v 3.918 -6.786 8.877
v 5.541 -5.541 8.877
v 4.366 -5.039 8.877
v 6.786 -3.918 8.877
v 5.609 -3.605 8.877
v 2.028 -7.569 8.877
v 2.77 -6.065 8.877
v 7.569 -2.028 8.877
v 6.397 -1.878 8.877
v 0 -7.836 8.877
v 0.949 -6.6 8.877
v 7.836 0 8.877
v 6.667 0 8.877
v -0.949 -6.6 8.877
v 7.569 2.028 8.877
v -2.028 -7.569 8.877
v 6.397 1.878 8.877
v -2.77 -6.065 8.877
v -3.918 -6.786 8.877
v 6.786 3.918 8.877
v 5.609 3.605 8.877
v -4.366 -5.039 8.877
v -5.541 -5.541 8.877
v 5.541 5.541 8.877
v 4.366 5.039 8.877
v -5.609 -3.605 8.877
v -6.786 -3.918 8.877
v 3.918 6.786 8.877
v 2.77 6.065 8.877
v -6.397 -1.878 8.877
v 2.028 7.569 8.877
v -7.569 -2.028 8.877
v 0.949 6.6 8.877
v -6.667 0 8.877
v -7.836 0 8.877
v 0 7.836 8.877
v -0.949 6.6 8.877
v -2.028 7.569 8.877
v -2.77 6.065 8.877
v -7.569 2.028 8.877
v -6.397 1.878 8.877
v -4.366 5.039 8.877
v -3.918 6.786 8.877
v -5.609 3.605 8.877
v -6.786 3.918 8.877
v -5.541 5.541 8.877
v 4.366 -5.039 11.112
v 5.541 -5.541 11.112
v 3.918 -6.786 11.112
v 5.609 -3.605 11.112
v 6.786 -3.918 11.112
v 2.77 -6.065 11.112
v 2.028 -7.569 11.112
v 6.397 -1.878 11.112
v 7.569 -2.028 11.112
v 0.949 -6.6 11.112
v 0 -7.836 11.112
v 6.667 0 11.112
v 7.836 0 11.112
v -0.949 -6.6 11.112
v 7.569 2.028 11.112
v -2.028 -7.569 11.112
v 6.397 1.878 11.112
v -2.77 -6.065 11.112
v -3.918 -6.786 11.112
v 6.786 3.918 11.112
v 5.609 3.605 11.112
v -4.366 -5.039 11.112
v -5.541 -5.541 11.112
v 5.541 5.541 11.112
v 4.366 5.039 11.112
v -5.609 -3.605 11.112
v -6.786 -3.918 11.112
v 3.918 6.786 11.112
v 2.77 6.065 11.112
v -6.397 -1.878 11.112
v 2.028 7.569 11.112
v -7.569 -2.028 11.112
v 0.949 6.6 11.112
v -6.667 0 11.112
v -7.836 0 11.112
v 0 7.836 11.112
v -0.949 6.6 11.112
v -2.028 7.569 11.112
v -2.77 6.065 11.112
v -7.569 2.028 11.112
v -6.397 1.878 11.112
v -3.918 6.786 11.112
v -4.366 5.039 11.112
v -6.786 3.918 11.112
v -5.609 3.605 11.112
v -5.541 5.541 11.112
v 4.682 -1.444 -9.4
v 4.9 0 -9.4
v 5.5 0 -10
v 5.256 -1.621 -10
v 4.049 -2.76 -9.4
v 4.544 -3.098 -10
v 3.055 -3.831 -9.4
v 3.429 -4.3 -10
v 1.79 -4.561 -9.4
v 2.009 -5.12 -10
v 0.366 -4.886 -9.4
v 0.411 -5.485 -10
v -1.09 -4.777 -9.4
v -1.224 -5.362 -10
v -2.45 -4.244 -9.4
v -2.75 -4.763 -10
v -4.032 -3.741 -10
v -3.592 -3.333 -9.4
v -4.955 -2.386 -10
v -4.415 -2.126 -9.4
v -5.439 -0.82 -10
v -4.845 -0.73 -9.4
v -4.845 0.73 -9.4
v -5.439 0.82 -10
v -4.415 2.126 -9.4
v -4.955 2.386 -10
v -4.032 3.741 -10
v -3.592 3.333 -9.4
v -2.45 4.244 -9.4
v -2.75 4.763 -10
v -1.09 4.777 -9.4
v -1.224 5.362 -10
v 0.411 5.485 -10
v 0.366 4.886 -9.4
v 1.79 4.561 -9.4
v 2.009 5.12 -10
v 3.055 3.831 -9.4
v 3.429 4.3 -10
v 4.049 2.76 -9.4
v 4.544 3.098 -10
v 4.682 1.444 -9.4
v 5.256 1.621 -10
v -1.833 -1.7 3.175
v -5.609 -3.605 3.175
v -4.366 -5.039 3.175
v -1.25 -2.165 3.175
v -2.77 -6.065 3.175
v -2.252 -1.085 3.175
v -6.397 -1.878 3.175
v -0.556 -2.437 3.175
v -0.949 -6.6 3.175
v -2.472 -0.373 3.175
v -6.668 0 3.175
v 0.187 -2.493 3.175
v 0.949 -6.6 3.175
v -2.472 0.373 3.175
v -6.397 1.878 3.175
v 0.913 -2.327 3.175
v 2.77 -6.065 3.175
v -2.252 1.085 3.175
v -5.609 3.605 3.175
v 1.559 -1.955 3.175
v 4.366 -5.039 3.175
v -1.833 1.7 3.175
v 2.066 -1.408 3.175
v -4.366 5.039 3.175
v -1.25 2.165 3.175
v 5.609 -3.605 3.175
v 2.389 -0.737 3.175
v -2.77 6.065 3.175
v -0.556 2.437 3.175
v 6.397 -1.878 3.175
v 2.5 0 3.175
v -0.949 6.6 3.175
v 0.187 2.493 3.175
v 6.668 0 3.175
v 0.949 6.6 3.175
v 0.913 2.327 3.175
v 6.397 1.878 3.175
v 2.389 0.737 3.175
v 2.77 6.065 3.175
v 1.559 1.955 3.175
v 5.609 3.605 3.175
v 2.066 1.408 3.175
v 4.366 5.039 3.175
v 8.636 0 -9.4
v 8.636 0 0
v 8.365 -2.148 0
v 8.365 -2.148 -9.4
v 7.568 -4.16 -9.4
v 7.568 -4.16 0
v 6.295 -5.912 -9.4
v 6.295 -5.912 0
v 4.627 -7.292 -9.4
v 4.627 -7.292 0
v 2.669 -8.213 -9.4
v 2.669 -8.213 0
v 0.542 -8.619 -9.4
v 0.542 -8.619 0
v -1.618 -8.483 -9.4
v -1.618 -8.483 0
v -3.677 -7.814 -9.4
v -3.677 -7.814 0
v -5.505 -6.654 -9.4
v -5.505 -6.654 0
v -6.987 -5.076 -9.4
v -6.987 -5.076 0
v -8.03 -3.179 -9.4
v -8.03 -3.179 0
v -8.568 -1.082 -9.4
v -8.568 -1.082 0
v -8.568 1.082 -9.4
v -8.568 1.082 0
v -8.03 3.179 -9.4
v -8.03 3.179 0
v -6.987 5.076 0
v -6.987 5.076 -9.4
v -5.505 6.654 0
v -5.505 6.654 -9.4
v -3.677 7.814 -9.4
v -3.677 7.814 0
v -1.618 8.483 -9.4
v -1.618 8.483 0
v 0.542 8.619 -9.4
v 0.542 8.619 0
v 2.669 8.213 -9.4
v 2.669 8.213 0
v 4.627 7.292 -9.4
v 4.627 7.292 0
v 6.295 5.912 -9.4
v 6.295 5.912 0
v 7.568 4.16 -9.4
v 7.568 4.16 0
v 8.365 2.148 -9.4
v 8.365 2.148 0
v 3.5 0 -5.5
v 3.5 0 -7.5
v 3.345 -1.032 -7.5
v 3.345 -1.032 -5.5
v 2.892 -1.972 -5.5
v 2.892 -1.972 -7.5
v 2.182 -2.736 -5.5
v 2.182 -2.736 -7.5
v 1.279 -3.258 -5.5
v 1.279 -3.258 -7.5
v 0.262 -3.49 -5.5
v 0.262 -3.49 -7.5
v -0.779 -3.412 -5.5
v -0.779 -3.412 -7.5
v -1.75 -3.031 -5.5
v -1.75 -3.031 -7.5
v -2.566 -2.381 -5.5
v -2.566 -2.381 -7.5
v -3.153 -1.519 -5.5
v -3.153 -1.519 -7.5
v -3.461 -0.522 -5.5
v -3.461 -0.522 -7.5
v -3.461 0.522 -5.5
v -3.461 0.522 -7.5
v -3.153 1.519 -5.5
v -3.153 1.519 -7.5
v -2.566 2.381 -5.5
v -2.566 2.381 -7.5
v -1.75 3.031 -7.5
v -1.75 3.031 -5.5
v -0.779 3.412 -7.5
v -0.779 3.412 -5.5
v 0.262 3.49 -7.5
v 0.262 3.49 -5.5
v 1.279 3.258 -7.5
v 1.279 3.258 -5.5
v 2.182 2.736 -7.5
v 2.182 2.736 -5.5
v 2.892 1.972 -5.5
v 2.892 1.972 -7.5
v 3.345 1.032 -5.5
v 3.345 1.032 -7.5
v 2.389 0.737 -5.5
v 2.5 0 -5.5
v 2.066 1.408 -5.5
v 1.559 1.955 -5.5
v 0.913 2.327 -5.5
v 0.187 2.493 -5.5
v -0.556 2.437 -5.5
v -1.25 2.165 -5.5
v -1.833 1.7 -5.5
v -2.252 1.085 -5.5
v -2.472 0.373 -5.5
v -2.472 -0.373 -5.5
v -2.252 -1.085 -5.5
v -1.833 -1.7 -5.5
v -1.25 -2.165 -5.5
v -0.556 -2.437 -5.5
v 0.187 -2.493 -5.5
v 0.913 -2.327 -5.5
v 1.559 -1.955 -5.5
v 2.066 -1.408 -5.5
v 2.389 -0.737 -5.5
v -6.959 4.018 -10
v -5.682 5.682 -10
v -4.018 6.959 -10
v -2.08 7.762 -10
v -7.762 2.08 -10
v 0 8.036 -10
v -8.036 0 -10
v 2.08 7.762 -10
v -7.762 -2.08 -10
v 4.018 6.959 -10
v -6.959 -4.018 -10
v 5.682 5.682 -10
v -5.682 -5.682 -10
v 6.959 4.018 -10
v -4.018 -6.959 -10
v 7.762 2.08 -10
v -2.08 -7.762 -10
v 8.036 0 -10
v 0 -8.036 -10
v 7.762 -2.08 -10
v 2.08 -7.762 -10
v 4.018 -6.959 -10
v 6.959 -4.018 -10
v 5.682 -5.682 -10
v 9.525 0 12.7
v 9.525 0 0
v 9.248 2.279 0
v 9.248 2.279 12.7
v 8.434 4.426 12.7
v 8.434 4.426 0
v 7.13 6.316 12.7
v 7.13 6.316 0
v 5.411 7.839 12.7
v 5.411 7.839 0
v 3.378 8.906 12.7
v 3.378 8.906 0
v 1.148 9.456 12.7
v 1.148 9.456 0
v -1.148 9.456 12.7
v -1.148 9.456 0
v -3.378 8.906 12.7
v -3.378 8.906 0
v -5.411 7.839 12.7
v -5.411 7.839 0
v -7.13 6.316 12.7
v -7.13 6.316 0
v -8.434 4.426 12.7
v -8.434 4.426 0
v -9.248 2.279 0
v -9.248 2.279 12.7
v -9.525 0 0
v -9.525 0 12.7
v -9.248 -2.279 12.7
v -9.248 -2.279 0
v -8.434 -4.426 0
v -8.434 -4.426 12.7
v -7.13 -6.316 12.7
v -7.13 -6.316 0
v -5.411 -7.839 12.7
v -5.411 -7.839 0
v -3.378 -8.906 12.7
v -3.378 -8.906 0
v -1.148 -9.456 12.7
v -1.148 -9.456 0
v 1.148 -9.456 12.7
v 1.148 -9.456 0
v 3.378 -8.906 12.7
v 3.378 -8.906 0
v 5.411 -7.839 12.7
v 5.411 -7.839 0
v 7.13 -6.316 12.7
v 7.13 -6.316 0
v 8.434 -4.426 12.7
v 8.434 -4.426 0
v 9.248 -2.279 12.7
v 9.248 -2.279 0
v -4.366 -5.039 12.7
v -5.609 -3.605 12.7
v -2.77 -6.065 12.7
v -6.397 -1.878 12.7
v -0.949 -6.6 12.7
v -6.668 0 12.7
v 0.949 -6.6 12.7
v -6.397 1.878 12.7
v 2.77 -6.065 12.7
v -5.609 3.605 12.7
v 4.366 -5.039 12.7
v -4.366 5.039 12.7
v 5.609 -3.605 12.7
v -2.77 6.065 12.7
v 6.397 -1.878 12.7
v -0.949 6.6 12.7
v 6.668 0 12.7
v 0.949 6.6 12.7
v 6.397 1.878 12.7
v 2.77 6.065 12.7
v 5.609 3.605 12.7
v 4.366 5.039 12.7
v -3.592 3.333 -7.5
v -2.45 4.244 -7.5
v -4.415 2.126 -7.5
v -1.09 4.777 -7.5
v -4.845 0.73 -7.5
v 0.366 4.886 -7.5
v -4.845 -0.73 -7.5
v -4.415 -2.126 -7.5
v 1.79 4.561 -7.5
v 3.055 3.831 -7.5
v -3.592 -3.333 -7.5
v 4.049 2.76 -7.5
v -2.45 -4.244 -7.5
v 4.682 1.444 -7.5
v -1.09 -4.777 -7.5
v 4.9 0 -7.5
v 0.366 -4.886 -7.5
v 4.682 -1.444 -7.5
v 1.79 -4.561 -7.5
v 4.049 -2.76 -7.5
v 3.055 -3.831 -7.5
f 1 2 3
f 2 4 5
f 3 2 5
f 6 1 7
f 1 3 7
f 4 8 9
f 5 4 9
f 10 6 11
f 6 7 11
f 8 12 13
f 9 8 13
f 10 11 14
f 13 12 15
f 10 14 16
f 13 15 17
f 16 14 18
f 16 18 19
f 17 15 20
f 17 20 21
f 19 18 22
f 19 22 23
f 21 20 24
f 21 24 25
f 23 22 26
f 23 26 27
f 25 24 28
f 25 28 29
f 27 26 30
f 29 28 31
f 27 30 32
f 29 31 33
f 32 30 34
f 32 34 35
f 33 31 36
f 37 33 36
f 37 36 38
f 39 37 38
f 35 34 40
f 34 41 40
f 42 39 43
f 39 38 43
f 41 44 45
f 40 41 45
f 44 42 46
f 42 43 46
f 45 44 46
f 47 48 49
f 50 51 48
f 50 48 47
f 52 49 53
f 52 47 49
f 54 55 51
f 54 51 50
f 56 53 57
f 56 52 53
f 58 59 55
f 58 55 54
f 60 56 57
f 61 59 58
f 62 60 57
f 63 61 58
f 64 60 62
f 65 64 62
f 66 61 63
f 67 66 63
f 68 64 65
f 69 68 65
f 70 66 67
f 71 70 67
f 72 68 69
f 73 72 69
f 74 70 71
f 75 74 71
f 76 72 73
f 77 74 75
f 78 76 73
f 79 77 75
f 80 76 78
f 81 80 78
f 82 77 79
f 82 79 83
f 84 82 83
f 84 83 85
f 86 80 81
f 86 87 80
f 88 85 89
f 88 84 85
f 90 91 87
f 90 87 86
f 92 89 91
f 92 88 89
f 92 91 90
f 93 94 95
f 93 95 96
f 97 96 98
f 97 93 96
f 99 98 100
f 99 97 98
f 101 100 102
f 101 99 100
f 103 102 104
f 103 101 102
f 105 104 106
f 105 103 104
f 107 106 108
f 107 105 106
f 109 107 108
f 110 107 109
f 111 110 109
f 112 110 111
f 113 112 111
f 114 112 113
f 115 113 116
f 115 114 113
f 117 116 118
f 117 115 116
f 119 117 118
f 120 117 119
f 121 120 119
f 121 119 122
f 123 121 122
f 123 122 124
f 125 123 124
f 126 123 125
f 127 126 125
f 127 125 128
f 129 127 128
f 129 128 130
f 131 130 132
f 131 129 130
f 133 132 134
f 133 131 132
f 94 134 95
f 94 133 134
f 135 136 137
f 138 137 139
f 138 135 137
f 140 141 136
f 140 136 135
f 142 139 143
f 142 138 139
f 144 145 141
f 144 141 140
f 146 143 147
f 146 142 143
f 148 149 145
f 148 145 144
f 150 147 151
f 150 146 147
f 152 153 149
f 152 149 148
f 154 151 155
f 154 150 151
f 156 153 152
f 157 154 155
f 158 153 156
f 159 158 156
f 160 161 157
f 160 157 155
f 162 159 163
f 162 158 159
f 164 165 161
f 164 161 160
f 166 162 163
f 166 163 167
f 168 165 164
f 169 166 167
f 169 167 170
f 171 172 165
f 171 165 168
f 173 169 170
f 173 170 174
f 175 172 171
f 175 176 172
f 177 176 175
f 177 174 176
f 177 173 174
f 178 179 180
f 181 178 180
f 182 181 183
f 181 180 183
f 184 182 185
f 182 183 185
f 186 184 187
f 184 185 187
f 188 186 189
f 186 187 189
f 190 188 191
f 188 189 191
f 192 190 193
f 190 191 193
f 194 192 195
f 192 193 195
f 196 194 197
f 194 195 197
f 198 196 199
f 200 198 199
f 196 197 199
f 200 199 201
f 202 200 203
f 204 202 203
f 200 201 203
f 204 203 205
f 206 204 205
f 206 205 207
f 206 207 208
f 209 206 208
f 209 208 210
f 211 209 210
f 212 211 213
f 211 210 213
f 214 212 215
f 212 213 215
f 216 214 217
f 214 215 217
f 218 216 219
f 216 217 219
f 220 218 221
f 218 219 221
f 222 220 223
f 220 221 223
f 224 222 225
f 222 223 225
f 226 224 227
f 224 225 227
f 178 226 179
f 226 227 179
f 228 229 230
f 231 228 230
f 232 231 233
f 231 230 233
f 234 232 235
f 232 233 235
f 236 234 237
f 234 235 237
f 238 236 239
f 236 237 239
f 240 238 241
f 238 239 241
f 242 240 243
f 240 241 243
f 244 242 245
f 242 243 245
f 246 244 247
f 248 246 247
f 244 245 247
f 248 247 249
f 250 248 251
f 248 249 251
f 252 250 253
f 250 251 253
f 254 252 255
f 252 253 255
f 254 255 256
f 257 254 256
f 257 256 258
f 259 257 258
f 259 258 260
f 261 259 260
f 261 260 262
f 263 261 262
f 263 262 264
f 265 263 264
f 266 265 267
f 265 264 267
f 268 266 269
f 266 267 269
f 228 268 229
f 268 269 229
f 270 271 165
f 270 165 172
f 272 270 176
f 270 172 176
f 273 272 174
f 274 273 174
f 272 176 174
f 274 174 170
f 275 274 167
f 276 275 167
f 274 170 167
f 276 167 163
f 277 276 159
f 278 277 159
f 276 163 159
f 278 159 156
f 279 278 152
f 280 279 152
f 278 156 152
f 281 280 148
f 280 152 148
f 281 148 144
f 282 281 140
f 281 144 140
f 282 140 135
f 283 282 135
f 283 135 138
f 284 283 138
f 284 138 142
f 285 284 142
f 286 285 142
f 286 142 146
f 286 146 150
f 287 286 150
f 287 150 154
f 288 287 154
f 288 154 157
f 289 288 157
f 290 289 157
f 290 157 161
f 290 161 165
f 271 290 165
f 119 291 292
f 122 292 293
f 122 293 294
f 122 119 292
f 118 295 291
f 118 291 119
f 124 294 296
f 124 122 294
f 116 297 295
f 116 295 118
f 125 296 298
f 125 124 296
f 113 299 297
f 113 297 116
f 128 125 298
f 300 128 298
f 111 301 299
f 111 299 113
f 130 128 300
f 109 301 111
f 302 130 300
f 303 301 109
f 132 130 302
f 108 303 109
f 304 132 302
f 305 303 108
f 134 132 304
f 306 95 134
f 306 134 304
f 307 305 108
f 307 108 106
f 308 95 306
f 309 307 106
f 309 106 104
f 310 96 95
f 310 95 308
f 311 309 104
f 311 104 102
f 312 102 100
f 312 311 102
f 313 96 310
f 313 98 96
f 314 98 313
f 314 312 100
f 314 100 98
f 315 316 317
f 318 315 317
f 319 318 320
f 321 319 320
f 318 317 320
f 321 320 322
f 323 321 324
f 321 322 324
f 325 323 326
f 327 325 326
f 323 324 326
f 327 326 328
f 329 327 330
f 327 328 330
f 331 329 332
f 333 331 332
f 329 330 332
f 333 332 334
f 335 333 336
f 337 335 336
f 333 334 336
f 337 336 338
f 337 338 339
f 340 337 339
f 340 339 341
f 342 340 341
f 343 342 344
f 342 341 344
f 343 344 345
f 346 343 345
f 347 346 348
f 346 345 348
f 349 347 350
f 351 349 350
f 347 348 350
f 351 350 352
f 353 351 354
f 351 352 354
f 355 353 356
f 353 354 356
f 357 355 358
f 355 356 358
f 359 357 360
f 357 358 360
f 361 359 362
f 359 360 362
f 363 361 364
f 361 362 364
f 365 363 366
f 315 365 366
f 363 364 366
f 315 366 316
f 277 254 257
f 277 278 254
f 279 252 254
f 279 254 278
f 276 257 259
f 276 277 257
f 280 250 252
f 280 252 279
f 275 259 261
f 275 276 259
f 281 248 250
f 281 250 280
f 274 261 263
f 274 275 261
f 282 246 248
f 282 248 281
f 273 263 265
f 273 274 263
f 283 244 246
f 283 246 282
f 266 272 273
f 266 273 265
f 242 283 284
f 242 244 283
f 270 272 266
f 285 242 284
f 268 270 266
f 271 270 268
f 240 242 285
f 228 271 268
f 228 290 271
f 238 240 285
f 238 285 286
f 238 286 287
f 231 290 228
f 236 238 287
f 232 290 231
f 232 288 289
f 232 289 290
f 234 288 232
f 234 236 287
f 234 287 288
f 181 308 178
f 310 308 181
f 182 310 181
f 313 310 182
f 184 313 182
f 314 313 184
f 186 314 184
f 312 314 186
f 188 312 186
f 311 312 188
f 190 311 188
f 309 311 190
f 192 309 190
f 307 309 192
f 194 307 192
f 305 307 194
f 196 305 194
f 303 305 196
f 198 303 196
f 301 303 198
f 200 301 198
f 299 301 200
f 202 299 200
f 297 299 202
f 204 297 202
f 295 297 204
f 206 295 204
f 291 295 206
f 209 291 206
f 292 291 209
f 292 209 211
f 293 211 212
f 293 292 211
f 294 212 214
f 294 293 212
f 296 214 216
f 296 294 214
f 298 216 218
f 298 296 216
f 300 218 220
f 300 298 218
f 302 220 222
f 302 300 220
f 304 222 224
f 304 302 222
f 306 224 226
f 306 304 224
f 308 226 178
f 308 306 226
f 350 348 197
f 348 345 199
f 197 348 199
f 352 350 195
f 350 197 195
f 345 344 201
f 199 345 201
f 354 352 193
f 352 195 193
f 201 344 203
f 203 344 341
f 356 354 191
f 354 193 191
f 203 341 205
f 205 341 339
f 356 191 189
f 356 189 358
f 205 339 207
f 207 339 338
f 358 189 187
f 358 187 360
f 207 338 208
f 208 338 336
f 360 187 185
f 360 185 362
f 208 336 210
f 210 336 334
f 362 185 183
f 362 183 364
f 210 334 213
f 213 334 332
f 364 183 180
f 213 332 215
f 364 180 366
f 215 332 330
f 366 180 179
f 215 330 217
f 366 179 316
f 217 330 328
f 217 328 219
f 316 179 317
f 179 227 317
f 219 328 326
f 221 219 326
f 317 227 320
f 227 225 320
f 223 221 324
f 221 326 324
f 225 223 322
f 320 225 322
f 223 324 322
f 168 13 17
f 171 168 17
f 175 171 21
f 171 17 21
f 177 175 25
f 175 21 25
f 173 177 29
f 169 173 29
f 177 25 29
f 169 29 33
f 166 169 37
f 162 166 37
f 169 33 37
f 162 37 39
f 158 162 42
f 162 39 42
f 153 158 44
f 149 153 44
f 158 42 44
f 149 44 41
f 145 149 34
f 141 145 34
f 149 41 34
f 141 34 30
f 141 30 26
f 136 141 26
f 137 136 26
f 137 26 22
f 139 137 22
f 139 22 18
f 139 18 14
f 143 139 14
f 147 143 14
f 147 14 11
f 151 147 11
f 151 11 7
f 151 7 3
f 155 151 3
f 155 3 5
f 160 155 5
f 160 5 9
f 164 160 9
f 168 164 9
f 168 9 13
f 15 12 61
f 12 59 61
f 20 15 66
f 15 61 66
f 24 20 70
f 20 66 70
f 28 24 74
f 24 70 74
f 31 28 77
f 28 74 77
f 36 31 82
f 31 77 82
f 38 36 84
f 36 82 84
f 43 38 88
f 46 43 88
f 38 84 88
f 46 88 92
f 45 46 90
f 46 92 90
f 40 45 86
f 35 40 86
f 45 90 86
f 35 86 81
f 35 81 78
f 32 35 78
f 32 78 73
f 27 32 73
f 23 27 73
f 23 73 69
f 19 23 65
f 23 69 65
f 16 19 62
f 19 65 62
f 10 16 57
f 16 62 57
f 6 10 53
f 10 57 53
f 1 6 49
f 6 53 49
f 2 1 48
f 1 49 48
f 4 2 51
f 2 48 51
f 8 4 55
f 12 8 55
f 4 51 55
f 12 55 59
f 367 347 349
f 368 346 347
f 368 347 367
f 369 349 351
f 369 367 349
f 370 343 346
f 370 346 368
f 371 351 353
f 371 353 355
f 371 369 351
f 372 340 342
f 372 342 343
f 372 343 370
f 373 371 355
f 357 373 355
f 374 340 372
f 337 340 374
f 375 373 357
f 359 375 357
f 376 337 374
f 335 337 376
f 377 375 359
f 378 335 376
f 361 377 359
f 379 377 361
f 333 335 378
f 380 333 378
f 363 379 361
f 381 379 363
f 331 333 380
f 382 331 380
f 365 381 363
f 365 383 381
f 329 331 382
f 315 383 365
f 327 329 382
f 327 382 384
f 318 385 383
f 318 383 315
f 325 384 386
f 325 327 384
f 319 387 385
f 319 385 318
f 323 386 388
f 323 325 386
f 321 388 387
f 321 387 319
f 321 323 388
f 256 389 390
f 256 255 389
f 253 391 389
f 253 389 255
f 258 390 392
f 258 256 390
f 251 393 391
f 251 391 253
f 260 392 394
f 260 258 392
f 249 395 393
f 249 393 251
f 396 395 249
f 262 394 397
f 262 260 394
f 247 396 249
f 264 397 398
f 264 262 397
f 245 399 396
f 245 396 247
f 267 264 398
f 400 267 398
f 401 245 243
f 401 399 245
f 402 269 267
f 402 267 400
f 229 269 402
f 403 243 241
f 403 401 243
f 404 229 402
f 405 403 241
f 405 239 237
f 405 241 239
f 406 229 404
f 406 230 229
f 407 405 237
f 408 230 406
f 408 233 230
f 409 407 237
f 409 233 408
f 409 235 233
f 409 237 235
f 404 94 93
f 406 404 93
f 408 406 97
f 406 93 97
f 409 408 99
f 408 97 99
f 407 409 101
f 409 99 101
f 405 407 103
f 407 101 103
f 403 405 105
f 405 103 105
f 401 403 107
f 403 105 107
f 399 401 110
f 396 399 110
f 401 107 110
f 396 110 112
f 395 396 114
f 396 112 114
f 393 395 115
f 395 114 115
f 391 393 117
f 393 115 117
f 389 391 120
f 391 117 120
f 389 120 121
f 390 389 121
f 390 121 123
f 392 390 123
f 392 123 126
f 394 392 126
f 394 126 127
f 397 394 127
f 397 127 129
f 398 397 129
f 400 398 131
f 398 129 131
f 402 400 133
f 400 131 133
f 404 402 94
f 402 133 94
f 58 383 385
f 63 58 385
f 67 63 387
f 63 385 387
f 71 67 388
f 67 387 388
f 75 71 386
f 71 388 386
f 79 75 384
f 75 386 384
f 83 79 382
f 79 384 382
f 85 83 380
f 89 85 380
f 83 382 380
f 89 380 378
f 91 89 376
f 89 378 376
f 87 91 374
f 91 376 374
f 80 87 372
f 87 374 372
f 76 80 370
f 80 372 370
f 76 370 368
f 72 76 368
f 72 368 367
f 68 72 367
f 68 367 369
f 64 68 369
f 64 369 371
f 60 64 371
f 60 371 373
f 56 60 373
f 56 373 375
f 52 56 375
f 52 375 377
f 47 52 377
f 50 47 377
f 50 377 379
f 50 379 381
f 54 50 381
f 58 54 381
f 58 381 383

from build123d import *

# Parameters (mm, degrees)
F0_R      = 9.525
F1_DEPTH  = 12.7
F2_R      = 6.6675
F3_DEPTH  = 9.525
F4_W      = 1.1684
F4_H      = 2.2352
F6_R      = 8.636
F7_DEPTH  = 10
F8_R      = 4.9
F9_DEPTH  = 2.5
F10_R     = 2.5
F11_DEPTH = 25.4
F12_R     = 3.5
F13_DEPTH = 2
F14_SIZE  = 0.6


with BuildPart() as f1:
    # F0 (on Top) → F1 (new body)
    with BuildSketch(Plane.XY):
        Circle(F0_R)
    extrude(amount=F1_DEPTH)

    # F2 (on face) → F3 (cut)
    with BuildSketch(Plane.XY.offset(12.7)):
        Circle(F2_R)
    extrude(amount=-F3_DEPTH, mode=Mode.SUBTRACT)

    # F4 (on Front) → F5 (revolve, cut)
    with BuildSketch(Plane.XZ):
        with Locations((7.2517, 9.9949)):
            Rectangle(F4_W, F4_H)
    revolve(axis=Axis((0, 0, 19.022157), (0, 0, 1)), mode=Mode.SUBTRACT)

    # F6 (on face) → F7 (join)
    with BuildSketch(Plane(origin=(0, 0, 0), x_dir=(1, 0, 0), z_dir=(0, 0, -1))):
        Circle(F6_R)
    extrude(amount=F7_DEPTH)

    # F8 (on face) → F9 (cut)
    with BuildSketch(Plane(origin=(0, 0, -10), x_dir=(1, 0, 0), z_dir=(0, 0, -1))):
        Circle(F8_R)
    extrude(amount=-F9_DEPTH, mode=Mode.SUBTRACT)

    # F10 (on face) → F11 (cut)
    with BuildSketch(Plane.XY.offset(3.175)):
        Circle(F10_R)
    extrude(amount=-F11_DEPTH, mode=Mode.SUBTRACT)

    # F12 (on face) → F13 (cut)
    with BuildSketch(Plane(origin=(0, 0, -7.5), x_dir=(1, 0, 0), z_dir=(0, 0, -1))):
        Circle(F12_R)
    extrude(amount=-F13_DEPTH, mode=Mode.SUBTRACT)

    # F14
    f14_edges = [f1.edges().sort_by_distance(p)[0] for p in [
        (-4.9, 0, -10),
        (-8.636, 0, -10),
    ]]
    chamfer(f14_edges, length=F14_SIZE)


solid = f1.part
